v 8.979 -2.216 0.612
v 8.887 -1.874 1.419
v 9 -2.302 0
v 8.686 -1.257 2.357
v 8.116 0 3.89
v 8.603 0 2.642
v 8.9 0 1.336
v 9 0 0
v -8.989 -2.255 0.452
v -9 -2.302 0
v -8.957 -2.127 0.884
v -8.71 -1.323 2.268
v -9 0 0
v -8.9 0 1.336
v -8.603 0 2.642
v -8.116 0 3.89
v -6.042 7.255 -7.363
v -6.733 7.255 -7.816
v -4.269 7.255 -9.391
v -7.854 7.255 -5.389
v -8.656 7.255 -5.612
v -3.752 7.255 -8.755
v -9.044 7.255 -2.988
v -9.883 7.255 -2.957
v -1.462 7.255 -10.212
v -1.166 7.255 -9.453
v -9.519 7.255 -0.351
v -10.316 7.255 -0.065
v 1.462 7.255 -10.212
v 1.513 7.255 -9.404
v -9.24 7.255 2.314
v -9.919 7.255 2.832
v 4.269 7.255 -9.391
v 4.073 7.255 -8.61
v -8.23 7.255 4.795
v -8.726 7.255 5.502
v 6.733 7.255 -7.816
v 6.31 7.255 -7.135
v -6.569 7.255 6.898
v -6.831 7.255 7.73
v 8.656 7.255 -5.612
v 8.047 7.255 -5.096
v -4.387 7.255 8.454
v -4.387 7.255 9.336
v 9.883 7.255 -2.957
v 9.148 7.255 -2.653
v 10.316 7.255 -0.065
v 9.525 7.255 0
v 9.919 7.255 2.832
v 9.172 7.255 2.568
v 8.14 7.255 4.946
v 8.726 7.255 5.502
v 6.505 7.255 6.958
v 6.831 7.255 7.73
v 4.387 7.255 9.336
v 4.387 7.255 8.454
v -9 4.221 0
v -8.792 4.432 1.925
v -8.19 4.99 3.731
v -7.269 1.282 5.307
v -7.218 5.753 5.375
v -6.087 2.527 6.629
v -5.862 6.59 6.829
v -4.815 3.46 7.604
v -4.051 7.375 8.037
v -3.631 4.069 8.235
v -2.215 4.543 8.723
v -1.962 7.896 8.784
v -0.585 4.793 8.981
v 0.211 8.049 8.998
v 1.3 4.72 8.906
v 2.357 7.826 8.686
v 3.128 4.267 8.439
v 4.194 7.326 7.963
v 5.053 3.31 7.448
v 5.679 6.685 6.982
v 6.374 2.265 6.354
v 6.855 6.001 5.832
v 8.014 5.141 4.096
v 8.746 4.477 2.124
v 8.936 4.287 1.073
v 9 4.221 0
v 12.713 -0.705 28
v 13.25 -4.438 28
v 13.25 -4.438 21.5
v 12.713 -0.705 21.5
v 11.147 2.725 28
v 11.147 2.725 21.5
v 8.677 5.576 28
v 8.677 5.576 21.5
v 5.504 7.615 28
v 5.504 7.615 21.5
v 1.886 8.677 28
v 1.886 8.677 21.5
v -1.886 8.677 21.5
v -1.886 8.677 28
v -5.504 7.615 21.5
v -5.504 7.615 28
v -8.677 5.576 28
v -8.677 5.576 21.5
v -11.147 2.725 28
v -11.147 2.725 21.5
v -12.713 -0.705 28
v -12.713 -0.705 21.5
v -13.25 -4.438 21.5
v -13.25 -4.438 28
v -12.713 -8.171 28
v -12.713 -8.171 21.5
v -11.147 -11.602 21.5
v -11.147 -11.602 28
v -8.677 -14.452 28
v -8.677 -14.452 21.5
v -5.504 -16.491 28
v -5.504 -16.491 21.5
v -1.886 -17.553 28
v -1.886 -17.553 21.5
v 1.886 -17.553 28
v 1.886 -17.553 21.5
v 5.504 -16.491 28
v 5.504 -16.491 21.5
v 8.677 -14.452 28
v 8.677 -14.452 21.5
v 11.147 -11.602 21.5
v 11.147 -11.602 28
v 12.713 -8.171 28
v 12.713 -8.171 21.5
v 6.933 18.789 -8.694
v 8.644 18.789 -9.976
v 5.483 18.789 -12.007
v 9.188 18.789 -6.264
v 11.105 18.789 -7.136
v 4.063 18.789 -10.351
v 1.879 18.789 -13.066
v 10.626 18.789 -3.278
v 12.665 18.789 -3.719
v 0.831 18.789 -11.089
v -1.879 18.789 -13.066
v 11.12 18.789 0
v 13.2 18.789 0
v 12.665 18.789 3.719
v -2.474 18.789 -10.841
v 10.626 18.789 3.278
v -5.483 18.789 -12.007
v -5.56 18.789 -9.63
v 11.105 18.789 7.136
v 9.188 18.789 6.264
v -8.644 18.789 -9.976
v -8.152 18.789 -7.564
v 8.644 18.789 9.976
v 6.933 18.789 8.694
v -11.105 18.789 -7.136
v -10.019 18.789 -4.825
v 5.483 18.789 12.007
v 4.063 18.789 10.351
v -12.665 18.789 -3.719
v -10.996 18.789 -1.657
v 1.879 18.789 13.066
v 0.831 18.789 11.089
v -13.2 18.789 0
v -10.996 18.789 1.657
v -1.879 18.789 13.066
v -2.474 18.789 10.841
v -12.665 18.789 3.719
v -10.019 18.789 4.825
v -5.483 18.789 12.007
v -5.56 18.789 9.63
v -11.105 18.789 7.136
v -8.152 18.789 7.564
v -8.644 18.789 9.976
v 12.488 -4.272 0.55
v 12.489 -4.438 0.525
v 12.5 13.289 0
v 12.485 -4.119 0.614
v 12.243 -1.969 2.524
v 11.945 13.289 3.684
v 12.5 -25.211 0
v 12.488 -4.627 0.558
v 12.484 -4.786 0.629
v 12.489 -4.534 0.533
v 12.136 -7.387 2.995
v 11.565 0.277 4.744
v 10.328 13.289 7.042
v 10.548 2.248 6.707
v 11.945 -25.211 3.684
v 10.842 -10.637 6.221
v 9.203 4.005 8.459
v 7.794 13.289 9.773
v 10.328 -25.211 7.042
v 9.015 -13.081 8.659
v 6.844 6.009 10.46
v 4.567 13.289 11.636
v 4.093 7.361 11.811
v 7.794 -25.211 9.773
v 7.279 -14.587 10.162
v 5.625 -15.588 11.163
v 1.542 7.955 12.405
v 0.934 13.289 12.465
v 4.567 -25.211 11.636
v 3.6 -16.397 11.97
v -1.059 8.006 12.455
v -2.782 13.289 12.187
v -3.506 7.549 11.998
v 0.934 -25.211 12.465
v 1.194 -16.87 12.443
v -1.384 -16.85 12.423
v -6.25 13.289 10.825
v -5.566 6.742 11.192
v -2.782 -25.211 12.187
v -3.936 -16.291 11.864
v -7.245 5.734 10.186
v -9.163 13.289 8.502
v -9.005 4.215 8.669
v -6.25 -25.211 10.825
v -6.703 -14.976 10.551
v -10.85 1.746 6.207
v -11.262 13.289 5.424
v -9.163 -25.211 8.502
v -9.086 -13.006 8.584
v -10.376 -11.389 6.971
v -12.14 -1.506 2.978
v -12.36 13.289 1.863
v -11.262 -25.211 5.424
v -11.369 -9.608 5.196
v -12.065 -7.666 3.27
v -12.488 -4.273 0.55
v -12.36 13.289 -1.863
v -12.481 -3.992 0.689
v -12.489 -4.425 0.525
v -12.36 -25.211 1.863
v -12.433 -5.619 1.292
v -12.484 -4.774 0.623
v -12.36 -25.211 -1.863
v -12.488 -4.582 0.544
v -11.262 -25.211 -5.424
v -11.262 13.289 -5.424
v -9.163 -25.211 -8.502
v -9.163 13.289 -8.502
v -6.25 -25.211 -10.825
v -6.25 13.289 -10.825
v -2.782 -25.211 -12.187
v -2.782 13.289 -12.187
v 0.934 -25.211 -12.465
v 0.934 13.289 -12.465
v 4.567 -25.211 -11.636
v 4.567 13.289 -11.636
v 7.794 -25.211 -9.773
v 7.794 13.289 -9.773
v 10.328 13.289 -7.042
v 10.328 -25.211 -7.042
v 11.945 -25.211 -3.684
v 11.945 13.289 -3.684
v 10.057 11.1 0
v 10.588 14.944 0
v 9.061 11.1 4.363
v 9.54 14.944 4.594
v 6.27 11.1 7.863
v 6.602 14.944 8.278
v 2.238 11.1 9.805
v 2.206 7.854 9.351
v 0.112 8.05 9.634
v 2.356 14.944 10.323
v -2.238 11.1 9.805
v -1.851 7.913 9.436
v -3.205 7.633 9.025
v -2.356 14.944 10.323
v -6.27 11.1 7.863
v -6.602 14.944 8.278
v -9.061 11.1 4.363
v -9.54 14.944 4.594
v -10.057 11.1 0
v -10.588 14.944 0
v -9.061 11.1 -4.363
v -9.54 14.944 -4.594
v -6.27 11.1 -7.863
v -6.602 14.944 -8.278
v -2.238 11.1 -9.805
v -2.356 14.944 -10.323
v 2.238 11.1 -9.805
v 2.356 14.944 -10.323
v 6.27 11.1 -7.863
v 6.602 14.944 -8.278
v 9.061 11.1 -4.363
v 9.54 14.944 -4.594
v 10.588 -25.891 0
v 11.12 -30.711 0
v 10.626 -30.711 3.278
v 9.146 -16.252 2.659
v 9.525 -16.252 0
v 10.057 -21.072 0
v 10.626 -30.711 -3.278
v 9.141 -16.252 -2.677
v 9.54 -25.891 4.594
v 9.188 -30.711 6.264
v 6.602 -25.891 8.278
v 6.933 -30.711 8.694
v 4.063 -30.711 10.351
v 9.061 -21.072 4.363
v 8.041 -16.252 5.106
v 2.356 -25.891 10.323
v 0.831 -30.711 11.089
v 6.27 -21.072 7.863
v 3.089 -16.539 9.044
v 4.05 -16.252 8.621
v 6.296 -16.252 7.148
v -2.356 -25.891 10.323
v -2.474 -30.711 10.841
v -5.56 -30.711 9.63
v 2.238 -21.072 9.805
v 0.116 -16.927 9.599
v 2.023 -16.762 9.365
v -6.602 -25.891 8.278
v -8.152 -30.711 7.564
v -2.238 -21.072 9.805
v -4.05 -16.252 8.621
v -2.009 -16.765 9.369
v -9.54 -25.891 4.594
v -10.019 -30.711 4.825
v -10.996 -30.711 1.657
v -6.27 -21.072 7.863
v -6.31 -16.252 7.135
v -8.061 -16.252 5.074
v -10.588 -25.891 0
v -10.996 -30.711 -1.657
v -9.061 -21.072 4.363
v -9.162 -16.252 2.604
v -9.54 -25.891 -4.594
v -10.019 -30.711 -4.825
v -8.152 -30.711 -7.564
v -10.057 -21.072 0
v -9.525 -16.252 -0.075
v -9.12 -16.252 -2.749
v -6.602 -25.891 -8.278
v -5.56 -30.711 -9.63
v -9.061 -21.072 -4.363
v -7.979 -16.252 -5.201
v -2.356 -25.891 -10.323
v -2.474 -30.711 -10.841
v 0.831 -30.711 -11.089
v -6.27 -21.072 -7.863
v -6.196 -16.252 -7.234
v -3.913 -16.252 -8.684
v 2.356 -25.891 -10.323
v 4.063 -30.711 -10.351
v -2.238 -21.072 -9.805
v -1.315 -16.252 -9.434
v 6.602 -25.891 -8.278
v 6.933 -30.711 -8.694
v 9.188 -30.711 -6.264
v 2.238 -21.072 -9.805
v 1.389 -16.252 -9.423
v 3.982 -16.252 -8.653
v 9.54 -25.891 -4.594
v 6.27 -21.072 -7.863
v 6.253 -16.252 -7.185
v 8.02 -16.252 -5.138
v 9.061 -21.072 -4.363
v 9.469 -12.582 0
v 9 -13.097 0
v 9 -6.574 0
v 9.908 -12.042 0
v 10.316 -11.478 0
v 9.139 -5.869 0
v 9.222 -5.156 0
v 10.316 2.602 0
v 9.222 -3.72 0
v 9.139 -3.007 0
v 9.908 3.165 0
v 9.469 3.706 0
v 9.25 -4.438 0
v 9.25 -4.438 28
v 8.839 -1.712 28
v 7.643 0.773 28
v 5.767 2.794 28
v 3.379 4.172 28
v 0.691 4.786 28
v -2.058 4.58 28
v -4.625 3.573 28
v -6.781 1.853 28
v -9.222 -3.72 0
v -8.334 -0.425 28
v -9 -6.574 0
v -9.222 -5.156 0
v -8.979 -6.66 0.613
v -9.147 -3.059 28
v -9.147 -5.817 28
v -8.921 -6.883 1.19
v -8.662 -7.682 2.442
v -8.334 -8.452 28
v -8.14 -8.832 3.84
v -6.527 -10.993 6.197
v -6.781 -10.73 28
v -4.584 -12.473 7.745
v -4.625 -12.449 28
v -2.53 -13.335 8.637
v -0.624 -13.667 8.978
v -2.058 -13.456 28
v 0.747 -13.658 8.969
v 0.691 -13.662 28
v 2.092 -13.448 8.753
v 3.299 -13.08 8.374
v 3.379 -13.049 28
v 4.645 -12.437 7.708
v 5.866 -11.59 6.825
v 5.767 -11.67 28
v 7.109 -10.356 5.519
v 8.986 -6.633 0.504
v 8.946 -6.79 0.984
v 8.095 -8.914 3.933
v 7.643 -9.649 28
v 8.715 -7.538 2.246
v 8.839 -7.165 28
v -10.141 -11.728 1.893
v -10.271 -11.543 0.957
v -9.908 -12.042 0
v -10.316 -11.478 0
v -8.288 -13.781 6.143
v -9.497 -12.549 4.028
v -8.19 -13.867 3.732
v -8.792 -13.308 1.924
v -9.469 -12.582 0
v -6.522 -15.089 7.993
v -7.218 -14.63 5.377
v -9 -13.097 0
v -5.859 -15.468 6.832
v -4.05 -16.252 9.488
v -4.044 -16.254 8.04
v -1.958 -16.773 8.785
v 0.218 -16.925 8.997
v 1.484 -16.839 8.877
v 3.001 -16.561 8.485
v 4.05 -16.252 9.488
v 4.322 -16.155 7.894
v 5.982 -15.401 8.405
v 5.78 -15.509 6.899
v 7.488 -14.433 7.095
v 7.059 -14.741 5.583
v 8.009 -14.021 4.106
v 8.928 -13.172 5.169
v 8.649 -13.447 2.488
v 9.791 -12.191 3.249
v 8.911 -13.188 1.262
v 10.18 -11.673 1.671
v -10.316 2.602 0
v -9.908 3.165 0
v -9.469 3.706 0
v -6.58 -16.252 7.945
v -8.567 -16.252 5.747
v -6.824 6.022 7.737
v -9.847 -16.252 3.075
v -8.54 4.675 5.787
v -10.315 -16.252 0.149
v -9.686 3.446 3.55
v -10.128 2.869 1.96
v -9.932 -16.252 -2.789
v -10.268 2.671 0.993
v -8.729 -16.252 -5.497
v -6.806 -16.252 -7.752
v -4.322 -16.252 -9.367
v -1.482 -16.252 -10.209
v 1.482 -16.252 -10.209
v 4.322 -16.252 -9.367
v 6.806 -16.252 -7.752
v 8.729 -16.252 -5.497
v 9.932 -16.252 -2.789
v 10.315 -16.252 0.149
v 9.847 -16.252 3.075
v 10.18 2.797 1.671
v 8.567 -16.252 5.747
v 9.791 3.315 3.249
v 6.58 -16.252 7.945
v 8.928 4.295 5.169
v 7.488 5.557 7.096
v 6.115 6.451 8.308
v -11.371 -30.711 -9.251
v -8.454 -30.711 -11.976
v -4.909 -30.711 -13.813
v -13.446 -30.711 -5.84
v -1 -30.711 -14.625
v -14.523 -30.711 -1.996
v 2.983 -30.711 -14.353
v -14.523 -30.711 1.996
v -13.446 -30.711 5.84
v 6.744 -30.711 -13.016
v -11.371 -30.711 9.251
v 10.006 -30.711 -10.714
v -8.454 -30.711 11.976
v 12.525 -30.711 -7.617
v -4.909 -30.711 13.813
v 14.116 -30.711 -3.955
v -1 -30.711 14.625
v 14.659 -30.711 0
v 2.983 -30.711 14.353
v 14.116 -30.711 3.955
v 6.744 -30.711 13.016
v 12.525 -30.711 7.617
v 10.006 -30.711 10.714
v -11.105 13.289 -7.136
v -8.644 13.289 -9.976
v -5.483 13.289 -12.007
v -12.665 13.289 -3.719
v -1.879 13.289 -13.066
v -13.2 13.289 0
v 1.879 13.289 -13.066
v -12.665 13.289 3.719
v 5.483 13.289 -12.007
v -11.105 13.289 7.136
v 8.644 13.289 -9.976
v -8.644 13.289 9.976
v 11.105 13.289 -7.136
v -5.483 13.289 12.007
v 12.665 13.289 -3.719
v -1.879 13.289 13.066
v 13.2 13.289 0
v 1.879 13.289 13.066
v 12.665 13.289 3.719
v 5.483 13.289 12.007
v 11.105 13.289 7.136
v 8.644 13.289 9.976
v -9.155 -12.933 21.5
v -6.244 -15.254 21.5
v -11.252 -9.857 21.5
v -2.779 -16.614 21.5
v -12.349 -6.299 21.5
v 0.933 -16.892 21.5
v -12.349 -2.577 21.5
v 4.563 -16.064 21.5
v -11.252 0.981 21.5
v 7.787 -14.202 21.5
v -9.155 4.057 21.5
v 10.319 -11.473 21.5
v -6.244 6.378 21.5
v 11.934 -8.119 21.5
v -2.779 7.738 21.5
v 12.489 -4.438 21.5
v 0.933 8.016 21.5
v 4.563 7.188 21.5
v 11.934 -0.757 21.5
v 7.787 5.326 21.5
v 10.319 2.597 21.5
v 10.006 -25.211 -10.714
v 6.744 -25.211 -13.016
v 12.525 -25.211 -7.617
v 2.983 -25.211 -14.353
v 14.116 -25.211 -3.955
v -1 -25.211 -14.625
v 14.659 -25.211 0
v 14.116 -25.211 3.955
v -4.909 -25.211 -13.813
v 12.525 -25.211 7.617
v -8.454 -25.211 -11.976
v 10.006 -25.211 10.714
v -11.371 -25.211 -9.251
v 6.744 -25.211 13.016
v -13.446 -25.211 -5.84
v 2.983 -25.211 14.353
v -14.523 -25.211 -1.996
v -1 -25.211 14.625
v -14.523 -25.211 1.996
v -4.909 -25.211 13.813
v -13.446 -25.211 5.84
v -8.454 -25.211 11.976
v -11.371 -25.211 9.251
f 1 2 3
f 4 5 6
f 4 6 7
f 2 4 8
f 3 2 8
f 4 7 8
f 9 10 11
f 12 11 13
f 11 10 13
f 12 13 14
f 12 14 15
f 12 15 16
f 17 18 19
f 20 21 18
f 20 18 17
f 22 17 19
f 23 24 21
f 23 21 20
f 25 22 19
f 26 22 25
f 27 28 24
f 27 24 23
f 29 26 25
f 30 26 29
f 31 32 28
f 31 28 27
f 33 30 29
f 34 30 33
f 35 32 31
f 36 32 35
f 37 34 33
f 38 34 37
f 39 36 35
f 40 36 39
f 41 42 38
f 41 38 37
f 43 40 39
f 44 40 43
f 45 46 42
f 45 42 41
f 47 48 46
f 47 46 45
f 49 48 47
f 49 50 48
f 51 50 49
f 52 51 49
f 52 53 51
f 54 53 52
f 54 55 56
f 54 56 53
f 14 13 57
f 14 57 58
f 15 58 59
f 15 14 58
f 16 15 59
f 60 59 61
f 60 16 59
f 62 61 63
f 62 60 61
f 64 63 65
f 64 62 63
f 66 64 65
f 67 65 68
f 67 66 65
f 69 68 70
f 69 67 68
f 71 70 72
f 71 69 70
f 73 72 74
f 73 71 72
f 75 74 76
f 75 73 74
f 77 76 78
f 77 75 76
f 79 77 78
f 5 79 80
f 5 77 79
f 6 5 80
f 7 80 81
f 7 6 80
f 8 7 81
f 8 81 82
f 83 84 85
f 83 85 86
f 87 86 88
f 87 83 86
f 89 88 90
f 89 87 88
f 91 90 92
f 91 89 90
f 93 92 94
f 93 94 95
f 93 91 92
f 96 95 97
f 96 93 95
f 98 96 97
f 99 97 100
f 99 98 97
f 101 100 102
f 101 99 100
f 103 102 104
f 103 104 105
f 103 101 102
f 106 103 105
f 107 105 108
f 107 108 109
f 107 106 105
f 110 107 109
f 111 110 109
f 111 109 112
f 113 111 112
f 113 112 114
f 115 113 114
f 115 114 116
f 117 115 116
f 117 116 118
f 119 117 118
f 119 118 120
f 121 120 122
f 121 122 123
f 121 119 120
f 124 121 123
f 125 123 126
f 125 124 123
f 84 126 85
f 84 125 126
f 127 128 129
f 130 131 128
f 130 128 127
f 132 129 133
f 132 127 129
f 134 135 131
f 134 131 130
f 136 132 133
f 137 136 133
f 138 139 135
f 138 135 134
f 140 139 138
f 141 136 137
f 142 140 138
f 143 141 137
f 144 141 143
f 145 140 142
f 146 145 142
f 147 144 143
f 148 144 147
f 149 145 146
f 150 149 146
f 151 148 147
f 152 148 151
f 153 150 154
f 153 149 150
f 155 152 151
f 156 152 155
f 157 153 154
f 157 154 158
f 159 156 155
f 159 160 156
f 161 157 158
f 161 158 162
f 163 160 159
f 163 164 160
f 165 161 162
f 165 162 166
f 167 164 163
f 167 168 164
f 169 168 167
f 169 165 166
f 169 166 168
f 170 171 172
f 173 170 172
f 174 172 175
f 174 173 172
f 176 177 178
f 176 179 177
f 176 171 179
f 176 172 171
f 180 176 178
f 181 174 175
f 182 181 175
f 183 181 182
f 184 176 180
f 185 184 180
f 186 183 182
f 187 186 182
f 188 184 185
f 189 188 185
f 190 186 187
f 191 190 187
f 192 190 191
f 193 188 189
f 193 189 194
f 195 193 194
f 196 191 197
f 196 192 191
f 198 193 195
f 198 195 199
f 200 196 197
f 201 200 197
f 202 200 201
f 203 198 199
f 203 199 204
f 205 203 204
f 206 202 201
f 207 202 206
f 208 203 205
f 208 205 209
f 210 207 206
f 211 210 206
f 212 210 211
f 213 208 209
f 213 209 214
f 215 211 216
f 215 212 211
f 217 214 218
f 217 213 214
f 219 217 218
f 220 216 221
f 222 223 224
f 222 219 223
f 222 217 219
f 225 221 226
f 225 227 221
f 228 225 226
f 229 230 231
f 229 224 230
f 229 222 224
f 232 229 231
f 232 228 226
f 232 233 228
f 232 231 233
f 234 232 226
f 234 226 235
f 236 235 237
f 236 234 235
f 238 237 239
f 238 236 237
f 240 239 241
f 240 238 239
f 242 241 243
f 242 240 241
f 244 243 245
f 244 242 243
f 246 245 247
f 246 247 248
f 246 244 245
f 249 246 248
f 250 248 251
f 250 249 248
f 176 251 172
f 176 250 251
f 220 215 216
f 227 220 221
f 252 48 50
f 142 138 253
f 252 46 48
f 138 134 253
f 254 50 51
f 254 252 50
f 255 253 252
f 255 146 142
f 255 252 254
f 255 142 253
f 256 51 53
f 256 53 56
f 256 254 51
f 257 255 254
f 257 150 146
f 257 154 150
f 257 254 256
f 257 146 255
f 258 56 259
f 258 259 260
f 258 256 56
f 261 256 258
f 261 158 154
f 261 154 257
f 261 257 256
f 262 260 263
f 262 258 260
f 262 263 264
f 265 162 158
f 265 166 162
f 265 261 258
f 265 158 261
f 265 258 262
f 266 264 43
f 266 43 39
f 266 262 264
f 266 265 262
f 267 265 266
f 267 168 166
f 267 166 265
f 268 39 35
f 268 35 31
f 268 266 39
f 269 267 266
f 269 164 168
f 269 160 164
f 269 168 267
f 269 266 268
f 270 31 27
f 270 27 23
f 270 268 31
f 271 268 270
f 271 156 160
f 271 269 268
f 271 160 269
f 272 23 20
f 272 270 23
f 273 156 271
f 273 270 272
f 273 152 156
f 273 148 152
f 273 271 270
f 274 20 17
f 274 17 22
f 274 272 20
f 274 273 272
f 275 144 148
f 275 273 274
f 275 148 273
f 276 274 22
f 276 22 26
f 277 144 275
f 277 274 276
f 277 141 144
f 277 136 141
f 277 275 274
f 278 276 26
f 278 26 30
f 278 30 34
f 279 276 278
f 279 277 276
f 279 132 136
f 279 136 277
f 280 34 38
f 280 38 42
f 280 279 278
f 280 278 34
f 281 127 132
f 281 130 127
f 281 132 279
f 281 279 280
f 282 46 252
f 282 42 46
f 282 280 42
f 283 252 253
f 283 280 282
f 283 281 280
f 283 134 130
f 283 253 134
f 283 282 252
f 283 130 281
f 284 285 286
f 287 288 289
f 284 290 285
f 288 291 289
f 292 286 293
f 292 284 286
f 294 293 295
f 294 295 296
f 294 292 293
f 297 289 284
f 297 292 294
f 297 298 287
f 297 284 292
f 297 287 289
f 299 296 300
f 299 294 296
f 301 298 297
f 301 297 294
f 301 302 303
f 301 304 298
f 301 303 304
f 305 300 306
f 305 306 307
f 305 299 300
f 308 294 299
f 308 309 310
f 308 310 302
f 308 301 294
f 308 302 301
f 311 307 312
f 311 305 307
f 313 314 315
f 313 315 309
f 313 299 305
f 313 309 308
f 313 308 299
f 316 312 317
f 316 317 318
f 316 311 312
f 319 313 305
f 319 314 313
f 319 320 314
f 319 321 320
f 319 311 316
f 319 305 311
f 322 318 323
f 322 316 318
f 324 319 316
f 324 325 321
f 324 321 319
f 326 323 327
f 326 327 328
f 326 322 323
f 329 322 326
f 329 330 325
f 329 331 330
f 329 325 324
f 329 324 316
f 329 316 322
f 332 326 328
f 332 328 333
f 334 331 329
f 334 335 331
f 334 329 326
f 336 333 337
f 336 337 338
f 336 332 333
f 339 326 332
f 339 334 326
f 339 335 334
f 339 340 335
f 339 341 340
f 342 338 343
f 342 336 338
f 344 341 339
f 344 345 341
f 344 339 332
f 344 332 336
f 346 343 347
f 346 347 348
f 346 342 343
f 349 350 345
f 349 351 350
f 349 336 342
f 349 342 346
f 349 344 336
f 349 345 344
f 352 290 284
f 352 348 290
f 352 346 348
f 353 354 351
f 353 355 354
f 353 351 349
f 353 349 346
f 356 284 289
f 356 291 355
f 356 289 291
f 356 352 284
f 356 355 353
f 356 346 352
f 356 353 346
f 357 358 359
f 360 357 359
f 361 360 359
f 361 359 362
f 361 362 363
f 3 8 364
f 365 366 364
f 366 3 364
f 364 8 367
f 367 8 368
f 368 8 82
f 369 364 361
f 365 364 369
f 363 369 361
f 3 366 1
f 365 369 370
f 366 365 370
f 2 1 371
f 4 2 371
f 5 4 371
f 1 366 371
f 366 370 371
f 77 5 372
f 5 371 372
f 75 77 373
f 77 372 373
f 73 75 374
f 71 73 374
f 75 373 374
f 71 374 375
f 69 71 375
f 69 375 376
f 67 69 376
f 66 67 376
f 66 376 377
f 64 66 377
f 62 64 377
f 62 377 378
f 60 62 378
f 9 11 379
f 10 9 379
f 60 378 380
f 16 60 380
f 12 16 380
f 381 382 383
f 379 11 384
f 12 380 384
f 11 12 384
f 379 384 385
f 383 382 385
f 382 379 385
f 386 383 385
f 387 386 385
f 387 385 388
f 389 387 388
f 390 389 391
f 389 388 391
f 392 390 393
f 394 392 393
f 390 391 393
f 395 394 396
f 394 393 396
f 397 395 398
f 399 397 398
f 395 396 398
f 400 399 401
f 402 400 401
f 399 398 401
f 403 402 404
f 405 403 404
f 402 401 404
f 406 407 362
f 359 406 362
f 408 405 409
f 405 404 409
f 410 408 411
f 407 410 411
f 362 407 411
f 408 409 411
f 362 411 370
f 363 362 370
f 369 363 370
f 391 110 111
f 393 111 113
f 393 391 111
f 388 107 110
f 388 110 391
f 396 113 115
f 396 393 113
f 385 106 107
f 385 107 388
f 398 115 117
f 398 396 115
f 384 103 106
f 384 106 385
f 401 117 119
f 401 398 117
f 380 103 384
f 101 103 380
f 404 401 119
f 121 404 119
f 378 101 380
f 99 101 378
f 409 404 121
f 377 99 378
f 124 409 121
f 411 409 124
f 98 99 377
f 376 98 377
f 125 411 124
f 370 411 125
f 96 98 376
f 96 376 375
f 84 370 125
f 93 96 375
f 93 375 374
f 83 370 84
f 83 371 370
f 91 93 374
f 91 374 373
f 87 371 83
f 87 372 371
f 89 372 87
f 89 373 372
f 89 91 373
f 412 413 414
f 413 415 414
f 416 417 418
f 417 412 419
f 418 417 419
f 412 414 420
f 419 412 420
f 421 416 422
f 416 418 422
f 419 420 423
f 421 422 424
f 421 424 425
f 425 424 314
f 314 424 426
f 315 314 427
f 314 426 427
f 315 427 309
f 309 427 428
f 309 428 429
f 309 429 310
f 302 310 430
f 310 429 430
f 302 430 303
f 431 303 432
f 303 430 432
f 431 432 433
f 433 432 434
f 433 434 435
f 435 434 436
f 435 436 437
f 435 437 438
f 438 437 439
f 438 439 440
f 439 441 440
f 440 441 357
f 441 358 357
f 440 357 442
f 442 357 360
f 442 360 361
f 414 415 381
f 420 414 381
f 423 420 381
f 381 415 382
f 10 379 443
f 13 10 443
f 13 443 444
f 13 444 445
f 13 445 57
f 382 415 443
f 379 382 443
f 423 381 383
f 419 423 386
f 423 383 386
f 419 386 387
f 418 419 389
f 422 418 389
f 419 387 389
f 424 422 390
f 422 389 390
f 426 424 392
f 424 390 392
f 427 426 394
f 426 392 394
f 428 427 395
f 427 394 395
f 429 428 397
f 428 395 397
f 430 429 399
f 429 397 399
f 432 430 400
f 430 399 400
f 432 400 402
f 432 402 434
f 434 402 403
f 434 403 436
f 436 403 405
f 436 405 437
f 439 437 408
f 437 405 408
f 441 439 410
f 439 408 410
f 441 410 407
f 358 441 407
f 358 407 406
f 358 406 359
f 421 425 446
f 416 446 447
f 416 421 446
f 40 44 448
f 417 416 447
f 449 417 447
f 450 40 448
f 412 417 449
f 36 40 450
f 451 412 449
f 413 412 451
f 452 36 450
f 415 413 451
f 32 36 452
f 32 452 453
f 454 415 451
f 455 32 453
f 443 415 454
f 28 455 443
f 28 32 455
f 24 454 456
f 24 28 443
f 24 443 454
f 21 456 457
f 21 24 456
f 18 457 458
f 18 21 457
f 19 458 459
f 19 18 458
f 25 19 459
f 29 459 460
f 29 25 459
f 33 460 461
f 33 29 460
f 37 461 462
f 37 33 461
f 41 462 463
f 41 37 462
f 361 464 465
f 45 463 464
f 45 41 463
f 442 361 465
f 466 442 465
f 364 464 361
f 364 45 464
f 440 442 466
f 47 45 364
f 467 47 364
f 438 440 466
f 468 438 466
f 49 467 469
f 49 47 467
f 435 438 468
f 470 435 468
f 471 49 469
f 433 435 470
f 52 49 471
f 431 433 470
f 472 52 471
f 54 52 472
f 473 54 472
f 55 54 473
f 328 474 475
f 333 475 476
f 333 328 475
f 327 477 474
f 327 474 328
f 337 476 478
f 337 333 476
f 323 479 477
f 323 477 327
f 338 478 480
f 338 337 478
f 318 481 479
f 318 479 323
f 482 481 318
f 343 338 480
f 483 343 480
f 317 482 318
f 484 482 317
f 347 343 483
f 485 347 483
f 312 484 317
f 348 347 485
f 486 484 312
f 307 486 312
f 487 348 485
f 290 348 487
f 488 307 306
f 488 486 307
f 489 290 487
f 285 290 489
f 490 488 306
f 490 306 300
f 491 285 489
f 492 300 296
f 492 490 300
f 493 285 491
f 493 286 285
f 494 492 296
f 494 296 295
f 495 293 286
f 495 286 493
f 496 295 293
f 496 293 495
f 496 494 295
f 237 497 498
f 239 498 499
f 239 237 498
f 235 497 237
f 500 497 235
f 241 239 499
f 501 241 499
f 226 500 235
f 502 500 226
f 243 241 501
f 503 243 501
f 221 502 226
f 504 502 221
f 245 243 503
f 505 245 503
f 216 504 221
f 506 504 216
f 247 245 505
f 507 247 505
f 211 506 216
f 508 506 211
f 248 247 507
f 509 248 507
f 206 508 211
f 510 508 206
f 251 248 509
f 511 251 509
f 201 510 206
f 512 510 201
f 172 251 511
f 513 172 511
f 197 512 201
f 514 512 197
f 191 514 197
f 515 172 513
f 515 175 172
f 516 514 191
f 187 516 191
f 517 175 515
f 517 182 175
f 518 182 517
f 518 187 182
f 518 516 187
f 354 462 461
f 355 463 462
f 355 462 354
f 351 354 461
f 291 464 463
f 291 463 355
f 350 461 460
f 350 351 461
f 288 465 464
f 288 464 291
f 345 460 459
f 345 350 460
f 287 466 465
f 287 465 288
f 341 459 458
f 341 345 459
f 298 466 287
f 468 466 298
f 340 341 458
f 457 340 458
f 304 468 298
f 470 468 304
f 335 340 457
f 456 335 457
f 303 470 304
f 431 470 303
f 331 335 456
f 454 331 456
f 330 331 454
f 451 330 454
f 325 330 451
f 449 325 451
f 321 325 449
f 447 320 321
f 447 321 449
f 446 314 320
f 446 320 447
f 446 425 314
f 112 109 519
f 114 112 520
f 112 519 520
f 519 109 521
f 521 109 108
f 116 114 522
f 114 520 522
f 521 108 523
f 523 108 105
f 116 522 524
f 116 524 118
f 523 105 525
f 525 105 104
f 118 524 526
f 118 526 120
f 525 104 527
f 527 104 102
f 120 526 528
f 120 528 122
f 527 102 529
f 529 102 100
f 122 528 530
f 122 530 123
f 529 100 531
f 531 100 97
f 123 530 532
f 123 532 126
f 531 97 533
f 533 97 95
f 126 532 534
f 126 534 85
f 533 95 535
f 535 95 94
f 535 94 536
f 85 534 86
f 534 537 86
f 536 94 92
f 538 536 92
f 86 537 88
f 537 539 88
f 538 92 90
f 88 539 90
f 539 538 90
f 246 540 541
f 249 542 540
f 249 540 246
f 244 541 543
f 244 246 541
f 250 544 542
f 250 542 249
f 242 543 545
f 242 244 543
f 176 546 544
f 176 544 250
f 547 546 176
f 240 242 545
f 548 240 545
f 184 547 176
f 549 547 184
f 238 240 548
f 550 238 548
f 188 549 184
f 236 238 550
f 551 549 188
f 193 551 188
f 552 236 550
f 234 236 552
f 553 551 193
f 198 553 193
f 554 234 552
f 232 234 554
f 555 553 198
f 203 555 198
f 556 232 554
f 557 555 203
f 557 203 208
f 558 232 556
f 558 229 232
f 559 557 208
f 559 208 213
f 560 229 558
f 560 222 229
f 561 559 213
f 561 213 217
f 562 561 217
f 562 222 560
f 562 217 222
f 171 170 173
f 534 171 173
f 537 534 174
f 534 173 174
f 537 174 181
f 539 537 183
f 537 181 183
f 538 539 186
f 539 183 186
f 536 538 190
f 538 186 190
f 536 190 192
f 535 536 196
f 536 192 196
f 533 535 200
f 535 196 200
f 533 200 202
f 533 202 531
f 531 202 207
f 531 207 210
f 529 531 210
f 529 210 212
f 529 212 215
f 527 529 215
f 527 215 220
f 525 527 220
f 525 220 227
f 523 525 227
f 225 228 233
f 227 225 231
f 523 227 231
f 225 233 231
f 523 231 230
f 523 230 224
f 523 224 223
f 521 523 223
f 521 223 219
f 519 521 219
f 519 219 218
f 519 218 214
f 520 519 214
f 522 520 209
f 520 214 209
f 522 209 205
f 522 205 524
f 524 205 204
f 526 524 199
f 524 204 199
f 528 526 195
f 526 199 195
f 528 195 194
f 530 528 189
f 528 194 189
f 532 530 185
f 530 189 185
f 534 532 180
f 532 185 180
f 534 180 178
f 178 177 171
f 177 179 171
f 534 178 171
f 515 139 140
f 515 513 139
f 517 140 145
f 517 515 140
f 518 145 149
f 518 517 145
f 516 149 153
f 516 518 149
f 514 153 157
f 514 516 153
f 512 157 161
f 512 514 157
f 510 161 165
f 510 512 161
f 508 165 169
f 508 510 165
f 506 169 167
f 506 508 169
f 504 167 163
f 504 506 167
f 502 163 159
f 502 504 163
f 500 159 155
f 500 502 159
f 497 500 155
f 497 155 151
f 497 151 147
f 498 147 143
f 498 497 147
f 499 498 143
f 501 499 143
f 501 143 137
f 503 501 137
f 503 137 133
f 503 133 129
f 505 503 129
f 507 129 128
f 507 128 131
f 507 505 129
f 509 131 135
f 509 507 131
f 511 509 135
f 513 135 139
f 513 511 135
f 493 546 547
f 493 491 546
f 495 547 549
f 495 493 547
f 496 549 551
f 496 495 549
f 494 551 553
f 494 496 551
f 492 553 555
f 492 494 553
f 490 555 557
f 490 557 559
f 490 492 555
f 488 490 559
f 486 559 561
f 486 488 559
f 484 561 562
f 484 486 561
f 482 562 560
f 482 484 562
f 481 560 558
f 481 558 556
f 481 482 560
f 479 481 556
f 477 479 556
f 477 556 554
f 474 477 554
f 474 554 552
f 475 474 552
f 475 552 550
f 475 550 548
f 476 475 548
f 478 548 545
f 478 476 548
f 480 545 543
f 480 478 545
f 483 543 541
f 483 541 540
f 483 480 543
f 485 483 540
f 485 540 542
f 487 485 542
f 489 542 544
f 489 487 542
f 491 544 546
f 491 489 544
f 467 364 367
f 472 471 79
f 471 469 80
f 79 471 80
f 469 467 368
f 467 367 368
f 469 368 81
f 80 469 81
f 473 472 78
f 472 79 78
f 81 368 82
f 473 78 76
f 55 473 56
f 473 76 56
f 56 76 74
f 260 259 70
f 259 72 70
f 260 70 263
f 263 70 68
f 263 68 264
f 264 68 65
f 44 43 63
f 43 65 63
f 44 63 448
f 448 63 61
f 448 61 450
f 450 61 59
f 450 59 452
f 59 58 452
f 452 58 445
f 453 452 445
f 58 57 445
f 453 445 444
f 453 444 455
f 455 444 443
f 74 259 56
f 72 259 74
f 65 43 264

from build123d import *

# Parameters (mm, degrees)
CROQUIS2_R                 = 12.488984619
SALIENTE_EXTRUIR1_DEPTH    = 28
CROQUIS3_R                 = 9
CORTAR_EXTRUIR1_DEPTH      = 19.788850508
CORTAR_EXTRUIR1_DEPTH_BACK = 31.711149692
CROQUIS4_R                 = 13.25
SALIENTE_EXTRUIR2_DEPTH    = 6.5
CORTAR_EXTRUIR2_REACH      = 44.659
CROQUIS5_R                 = 9.25


with BuildPart() as part:
    # Croquis1 → Revolución1 (revolve)
    with BuildSketch(Plane.XY):
        Polygon((11.12, 18.788850408), (13.2, 18.788850408), (13.2, 13.288850408), (12.5, 13.288850408), (12.5, -25.211149592), (14.659269355, -25.211149592), (14.659269355, -30.711149592), (11.12, -30.711149592), (9.525, -16.252125457), (10.31589022, -16.252125457), (10.31589022, 7.254829614), (9.525, 7.254829614), align=None)
    revolve(axis=Axis((0, 29.936319964, 0), (0, -1, 0)))

    # Croquis2 → Saliente-Extruir1 (add)
    with BuildSketch(Plane.XY):
        with Locations((0, -4.438102688)):
            Circle(CROQUIS2_R)
    extrude(amount=SALIENTE_EXTRUIR1_DEPTH)

    # Croquis3 → Cortar-Extruir1 (cut, two sides)
    with BuildSketch(Plane(origin=(0, 0, 0), x_dir=(1, 0, 0), z_dir=(0, 1, 0))) as cortar_extruir1_sk:
        Circle(CROQUIS3_R)
    extrude(amount=CORTAR_EXTRUIR1_DEPTH, mode=Mode.SUBTRACT)
    extrude(cortar_extruir1_sk.sketch, amount=-CORTAR_EXTRUIR1_DEPTH_BACK, mode=Mode.SUBTRACT)

    # Croquis4 → Saliente-Extruir2 (add)
    with BuildSketch(Plane.XY.offset(28)):
        with Locations((0, -4.438102688)):
            Circle(CROQUIS4_R)
    extrude(amount=-SALIENTE_EXTRUIR2_DEPTH)

    # Croquis5 → Cortar-Extruir2 (cut, up to next)
    with BuildSketch(Plane.XY.offset(28), mode=Mode.PRIVATE) as cortar_extruir2_sk1:
        with Locations((0, -4.438102688)):
            Circle(CROQUIS5_R)
    cortar_extruir2_tool1 = extrude(cortar_extruir2_sk1.sketch, amount=-CORTAR_EXTRUIR2_REACH, mode=Mode.PRIVATE) & part.part
    add(cortar_extruir2_tool1.solids().sort_by_distance((0, -4.438103, 28))[0], mode=Mode.SUBTRACT)


solid = part.part
